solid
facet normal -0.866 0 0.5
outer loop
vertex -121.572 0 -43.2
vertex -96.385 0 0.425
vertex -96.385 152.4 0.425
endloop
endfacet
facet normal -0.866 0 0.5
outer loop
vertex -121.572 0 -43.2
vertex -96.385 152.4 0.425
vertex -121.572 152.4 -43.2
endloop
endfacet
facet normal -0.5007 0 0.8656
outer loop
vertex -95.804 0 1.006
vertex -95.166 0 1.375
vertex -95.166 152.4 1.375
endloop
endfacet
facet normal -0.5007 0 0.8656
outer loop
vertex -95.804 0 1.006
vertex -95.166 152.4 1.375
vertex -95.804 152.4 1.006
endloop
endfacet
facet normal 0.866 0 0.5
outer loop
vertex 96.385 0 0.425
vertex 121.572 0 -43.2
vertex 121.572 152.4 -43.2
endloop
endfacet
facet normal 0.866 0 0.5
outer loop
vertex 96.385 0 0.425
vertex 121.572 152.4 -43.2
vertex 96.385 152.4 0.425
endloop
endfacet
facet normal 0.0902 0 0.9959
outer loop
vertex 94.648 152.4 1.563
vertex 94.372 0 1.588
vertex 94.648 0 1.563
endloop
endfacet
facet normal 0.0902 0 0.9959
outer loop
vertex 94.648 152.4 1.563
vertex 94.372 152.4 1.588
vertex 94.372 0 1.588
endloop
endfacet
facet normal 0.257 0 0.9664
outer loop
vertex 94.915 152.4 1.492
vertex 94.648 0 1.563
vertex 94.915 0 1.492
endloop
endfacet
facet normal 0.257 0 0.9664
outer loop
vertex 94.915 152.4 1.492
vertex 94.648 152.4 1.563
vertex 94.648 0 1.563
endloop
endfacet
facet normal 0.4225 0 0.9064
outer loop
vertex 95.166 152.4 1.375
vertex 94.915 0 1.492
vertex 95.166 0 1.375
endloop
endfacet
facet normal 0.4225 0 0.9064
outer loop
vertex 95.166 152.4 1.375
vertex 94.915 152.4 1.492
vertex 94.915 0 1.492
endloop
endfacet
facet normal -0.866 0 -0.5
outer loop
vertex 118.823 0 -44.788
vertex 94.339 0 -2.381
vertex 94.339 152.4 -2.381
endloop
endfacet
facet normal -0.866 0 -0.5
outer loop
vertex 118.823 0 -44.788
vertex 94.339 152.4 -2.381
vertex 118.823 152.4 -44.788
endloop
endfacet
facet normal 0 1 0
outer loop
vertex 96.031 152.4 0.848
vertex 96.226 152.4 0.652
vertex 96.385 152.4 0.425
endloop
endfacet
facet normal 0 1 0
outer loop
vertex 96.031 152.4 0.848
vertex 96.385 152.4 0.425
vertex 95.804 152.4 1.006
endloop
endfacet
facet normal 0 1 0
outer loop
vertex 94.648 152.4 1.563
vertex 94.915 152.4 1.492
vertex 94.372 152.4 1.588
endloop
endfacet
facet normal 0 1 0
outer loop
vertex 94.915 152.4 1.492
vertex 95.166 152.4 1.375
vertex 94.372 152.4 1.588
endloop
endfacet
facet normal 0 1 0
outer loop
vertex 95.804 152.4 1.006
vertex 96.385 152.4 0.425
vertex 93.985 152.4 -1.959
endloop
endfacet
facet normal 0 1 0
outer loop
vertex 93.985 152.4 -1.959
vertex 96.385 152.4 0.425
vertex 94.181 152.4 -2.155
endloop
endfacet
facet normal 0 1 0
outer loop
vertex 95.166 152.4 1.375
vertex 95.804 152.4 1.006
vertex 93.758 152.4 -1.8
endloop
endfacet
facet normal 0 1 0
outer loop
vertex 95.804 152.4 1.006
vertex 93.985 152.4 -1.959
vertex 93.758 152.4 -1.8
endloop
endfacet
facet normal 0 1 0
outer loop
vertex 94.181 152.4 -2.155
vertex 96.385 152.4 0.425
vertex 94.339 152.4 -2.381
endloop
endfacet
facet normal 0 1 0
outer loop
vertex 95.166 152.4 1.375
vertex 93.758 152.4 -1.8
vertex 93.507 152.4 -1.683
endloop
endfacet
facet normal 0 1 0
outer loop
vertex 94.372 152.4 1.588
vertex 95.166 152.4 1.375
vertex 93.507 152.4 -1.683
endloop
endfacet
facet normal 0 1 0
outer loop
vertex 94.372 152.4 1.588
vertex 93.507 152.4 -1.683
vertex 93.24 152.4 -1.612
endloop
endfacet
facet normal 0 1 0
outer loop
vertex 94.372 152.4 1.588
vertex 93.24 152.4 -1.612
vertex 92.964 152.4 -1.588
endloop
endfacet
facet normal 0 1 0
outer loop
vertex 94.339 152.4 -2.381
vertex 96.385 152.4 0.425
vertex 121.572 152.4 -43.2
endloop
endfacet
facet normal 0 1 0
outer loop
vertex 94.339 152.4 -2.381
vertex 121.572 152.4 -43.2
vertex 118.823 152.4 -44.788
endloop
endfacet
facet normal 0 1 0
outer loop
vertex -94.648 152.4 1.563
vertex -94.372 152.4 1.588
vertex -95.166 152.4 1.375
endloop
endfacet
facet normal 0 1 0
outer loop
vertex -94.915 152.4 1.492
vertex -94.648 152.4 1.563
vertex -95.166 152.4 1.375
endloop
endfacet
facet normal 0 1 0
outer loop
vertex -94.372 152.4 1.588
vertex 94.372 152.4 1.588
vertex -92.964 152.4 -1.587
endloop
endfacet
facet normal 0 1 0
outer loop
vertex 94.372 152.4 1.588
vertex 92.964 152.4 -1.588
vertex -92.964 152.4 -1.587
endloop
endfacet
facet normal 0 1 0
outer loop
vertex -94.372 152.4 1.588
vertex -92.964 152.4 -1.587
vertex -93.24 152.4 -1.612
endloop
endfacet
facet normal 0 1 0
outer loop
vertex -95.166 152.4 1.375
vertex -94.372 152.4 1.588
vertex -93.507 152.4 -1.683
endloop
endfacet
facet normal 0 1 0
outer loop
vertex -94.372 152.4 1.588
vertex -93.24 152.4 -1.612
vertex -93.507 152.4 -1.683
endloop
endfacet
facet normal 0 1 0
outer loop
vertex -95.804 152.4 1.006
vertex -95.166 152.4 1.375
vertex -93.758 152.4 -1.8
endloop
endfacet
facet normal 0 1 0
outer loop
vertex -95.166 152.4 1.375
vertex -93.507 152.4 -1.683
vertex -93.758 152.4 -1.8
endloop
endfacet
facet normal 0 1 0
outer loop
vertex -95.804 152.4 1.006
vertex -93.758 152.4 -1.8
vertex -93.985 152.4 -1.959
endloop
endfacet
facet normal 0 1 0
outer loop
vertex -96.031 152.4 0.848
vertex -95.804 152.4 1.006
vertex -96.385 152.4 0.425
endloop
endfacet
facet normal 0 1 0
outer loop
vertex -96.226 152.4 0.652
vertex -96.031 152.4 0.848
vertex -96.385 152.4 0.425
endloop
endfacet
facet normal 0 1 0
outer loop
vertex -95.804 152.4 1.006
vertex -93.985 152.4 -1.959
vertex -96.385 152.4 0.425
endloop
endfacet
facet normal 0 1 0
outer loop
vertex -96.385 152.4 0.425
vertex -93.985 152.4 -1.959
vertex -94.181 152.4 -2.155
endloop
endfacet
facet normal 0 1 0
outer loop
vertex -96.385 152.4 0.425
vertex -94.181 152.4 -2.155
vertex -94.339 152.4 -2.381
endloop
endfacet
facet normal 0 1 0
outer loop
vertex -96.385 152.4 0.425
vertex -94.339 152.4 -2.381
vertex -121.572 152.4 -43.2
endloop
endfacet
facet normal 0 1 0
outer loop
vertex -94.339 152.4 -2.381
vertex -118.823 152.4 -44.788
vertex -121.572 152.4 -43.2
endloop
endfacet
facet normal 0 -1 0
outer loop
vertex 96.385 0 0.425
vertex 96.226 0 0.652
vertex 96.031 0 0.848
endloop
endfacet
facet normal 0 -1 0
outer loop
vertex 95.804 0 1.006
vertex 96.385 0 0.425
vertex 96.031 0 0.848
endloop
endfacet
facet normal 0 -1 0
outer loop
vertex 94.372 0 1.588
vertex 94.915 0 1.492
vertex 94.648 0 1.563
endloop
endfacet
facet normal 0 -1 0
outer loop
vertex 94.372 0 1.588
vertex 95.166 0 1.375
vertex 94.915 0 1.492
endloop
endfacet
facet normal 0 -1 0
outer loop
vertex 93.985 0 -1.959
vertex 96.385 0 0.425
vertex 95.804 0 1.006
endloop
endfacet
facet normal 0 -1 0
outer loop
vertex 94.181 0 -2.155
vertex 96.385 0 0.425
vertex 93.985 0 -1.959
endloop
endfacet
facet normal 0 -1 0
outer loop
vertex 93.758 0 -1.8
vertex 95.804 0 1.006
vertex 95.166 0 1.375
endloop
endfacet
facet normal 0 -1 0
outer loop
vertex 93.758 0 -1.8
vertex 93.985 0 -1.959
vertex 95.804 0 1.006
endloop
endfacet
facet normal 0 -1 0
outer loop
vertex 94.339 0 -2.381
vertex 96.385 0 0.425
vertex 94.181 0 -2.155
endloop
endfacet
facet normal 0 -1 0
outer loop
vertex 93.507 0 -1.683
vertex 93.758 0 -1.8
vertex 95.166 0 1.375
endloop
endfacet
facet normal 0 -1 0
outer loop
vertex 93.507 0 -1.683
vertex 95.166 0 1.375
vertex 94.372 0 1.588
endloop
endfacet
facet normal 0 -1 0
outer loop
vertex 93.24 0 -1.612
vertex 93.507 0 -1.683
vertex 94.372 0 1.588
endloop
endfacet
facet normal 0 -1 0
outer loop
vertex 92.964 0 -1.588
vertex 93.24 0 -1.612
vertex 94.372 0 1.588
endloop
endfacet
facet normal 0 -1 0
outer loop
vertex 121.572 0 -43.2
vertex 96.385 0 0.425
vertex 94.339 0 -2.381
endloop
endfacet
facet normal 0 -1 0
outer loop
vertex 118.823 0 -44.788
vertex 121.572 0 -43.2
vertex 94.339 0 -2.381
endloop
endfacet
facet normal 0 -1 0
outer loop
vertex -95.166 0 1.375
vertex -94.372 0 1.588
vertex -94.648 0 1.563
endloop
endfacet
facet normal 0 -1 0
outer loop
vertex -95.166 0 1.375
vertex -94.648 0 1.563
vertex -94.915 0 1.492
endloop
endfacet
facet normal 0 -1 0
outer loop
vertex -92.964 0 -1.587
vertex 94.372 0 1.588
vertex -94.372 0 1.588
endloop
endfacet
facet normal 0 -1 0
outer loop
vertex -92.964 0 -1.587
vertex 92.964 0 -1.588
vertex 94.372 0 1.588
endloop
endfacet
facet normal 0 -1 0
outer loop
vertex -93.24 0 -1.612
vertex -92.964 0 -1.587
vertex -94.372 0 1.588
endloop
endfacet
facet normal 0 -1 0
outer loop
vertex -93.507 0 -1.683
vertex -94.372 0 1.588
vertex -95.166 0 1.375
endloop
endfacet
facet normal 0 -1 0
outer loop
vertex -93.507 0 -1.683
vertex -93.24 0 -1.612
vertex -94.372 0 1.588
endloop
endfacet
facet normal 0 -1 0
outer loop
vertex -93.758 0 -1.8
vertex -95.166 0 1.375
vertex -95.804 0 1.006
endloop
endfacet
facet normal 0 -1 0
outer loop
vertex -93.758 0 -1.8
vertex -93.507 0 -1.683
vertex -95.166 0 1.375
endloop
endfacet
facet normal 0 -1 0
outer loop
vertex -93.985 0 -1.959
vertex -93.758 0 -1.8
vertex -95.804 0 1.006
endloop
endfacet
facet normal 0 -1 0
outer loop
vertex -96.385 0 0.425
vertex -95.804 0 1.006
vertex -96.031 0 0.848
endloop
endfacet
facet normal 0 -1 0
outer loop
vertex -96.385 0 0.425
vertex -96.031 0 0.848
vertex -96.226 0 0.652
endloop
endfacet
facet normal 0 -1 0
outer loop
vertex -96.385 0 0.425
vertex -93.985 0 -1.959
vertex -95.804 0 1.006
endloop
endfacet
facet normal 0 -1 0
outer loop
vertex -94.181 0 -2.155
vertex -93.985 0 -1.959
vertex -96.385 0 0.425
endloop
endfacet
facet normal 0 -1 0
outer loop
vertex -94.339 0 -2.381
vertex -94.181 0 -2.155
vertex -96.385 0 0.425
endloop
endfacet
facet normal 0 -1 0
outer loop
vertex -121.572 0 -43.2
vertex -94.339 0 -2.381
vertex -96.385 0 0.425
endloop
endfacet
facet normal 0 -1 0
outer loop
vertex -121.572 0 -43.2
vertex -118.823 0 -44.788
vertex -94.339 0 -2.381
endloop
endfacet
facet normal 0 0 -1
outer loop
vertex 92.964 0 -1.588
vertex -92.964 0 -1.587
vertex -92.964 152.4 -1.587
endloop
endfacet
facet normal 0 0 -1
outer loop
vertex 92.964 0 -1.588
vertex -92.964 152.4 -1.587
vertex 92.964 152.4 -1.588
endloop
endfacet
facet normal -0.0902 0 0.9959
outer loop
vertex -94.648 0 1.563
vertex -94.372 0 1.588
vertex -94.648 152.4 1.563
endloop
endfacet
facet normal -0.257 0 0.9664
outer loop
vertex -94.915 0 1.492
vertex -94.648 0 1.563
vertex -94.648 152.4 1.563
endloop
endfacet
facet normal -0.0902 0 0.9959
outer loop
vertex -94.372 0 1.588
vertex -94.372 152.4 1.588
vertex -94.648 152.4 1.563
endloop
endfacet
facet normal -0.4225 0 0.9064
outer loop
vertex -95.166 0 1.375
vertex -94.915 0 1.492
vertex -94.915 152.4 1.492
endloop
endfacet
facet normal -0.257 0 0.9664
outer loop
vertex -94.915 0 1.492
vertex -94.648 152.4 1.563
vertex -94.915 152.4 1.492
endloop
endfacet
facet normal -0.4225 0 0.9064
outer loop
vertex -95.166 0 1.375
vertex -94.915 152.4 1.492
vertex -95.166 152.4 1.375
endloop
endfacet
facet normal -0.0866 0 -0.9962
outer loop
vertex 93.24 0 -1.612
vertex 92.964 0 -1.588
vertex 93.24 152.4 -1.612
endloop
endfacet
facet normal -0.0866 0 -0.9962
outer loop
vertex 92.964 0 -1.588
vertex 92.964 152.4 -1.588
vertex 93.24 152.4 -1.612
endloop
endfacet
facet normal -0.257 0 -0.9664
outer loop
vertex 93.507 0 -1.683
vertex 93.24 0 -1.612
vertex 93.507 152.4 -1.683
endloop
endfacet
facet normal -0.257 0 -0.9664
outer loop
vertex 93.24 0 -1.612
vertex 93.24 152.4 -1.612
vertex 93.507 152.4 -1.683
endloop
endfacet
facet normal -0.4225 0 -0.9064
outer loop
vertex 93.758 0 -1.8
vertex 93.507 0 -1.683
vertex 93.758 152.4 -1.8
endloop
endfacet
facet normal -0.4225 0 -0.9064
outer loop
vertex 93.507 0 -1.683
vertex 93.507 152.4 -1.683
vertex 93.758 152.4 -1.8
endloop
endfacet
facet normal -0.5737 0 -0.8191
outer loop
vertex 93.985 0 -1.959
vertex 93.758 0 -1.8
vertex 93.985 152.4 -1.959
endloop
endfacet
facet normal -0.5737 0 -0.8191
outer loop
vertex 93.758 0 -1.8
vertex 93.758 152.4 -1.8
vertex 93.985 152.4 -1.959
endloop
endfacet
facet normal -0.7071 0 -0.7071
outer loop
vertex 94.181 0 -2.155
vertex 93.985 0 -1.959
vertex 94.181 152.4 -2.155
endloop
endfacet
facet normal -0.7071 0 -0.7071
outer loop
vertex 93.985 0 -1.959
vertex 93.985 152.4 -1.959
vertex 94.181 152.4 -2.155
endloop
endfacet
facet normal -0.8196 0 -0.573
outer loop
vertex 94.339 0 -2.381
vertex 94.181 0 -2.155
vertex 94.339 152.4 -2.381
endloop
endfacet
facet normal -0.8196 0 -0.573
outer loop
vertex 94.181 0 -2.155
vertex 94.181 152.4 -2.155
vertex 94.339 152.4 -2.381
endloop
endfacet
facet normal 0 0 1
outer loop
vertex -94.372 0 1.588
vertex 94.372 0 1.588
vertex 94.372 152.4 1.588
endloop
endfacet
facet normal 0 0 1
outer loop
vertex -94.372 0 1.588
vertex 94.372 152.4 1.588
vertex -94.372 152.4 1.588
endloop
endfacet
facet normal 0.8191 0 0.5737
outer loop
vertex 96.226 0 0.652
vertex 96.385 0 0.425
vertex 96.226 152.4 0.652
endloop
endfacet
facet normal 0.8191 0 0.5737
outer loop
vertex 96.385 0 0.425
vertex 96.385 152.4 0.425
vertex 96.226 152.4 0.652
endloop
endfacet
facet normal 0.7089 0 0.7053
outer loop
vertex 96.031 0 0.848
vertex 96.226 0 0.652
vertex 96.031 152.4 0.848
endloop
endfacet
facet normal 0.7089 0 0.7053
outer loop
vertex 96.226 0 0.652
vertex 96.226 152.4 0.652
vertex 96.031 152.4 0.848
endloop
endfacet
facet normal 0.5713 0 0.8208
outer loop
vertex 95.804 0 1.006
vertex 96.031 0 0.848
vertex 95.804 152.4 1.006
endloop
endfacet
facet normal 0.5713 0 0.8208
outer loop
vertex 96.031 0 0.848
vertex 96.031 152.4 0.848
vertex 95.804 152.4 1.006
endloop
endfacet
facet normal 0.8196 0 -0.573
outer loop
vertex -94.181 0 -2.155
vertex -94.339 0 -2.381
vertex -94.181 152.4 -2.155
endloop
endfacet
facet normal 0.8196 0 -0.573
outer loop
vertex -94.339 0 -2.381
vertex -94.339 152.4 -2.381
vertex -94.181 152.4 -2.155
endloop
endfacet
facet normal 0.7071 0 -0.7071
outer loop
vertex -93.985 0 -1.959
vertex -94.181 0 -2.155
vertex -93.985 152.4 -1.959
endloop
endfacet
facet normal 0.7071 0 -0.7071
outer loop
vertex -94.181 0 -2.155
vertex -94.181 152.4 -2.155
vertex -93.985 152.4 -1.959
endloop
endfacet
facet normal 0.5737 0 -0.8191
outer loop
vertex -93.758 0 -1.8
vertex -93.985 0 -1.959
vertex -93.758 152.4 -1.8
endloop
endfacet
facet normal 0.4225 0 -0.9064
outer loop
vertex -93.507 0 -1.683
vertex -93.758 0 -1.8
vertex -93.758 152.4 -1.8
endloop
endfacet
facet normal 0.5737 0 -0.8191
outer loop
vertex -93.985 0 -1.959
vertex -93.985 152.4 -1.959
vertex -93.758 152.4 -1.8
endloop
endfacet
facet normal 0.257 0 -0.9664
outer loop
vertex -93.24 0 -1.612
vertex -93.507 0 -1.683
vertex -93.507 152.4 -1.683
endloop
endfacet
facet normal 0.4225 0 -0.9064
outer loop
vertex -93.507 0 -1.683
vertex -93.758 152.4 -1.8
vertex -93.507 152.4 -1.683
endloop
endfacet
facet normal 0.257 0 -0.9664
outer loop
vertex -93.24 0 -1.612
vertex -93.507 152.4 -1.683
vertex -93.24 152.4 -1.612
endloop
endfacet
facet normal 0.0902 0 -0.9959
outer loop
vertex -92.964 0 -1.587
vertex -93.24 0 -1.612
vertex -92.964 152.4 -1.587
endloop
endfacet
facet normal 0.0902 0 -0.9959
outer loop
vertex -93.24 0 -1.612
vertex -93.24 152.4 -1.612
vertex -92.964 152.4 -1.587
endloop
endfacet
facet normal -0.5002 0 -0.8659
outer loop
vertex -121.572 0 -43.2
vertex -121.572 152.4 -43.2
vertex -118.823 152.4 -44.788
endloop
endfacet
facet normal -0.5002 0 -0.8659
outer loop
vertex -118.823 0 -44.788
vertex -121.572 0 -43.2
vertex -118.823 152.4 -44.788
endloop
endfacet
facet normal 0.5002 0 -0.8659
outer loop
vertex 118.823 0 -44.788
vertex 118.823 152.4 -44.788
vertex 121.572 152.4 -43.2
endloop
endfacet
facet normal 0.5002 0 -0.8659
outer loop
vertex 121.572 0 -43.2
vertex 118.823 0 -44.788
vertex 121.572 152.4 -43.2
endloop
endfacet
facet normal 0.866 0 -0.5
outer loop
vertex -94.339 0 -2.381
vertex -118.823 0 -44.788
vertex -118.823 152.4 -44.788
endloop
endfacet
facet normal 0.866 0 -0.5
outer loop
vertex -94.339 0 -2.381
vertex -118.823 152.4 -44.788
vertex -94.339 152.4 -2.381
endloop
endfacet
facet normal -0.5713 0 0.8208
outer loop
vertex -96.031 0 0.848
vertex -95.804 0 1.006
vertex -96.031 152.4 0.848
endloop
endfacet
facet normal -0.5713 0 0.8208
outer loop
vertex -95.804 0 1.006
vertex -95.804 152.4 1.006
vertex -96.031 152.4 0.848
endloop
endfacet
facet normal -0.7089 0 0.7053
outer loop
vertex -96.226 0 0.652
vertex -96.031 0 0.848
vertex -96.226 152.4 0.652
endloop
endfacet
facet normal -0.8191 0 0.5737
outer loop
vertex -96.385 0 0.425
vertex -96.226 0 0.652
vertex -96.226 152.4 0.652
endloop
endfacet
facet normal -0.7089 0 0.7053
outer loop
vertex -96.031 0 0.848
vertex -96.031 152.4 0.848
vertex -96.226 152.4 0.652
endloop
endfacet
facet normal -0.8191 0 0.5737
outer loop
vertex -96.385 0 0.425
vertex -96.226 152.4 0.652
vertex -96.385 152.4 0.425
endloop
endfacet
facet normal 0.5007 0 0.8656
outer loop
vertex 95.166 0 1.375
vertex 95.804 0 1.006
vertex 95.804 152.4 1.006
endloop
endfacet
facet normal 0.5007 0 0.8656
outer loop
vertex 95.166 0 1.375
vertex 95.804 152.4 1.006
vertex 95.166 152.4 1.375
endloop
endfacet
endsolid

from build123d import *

# Parameters (mm, degrees)
BOSS_EXTRUDE1_DEPTH = 152.4
FILLET1_R           = 1.5875


with BuildPart() as part:
    # Sketch1 → Boss-Extrude1 (new body)
    with BuildSketch(Plane(origin=(0, 0, 0), x_dir=(1, 0, 0), z_dir=(0, 1, 0))):
        Polygon((94.7975625, -1.5875), (-94.7975625, -1.5875), (-96.172377829, -0.79375), (-121.572377829, 43.200340512), (-118.822747171, 44.787840512), (-93.881018948, 1.5875), (93.881018948, 1.5875), (118.822747171, 44.787840512), (121.572377829, 43.200340512), (96.172377829, -0.79375), align=None)
    extrude(amount=BOSS_EXTRUDE1_DEPTH)

    # Fillet1
    fillet1_edges = [part.edges().sort_by_distance(p)[0] for p in [
        (94.7975625, 76.2, 1.5875),
        (-94.7975625, 76.2, 1.5875),
        (-96.172377829, 76.2, 0.79375),
        (-93.881018948, 76.2, -1.5875),
        (93.881018948, 76.2, -1.5875),
        (96.172377829, 76.2, 0.79375),
    ]]
    fillet(fillet1_edges, radius=FILLET1_R)


solid = part.part
